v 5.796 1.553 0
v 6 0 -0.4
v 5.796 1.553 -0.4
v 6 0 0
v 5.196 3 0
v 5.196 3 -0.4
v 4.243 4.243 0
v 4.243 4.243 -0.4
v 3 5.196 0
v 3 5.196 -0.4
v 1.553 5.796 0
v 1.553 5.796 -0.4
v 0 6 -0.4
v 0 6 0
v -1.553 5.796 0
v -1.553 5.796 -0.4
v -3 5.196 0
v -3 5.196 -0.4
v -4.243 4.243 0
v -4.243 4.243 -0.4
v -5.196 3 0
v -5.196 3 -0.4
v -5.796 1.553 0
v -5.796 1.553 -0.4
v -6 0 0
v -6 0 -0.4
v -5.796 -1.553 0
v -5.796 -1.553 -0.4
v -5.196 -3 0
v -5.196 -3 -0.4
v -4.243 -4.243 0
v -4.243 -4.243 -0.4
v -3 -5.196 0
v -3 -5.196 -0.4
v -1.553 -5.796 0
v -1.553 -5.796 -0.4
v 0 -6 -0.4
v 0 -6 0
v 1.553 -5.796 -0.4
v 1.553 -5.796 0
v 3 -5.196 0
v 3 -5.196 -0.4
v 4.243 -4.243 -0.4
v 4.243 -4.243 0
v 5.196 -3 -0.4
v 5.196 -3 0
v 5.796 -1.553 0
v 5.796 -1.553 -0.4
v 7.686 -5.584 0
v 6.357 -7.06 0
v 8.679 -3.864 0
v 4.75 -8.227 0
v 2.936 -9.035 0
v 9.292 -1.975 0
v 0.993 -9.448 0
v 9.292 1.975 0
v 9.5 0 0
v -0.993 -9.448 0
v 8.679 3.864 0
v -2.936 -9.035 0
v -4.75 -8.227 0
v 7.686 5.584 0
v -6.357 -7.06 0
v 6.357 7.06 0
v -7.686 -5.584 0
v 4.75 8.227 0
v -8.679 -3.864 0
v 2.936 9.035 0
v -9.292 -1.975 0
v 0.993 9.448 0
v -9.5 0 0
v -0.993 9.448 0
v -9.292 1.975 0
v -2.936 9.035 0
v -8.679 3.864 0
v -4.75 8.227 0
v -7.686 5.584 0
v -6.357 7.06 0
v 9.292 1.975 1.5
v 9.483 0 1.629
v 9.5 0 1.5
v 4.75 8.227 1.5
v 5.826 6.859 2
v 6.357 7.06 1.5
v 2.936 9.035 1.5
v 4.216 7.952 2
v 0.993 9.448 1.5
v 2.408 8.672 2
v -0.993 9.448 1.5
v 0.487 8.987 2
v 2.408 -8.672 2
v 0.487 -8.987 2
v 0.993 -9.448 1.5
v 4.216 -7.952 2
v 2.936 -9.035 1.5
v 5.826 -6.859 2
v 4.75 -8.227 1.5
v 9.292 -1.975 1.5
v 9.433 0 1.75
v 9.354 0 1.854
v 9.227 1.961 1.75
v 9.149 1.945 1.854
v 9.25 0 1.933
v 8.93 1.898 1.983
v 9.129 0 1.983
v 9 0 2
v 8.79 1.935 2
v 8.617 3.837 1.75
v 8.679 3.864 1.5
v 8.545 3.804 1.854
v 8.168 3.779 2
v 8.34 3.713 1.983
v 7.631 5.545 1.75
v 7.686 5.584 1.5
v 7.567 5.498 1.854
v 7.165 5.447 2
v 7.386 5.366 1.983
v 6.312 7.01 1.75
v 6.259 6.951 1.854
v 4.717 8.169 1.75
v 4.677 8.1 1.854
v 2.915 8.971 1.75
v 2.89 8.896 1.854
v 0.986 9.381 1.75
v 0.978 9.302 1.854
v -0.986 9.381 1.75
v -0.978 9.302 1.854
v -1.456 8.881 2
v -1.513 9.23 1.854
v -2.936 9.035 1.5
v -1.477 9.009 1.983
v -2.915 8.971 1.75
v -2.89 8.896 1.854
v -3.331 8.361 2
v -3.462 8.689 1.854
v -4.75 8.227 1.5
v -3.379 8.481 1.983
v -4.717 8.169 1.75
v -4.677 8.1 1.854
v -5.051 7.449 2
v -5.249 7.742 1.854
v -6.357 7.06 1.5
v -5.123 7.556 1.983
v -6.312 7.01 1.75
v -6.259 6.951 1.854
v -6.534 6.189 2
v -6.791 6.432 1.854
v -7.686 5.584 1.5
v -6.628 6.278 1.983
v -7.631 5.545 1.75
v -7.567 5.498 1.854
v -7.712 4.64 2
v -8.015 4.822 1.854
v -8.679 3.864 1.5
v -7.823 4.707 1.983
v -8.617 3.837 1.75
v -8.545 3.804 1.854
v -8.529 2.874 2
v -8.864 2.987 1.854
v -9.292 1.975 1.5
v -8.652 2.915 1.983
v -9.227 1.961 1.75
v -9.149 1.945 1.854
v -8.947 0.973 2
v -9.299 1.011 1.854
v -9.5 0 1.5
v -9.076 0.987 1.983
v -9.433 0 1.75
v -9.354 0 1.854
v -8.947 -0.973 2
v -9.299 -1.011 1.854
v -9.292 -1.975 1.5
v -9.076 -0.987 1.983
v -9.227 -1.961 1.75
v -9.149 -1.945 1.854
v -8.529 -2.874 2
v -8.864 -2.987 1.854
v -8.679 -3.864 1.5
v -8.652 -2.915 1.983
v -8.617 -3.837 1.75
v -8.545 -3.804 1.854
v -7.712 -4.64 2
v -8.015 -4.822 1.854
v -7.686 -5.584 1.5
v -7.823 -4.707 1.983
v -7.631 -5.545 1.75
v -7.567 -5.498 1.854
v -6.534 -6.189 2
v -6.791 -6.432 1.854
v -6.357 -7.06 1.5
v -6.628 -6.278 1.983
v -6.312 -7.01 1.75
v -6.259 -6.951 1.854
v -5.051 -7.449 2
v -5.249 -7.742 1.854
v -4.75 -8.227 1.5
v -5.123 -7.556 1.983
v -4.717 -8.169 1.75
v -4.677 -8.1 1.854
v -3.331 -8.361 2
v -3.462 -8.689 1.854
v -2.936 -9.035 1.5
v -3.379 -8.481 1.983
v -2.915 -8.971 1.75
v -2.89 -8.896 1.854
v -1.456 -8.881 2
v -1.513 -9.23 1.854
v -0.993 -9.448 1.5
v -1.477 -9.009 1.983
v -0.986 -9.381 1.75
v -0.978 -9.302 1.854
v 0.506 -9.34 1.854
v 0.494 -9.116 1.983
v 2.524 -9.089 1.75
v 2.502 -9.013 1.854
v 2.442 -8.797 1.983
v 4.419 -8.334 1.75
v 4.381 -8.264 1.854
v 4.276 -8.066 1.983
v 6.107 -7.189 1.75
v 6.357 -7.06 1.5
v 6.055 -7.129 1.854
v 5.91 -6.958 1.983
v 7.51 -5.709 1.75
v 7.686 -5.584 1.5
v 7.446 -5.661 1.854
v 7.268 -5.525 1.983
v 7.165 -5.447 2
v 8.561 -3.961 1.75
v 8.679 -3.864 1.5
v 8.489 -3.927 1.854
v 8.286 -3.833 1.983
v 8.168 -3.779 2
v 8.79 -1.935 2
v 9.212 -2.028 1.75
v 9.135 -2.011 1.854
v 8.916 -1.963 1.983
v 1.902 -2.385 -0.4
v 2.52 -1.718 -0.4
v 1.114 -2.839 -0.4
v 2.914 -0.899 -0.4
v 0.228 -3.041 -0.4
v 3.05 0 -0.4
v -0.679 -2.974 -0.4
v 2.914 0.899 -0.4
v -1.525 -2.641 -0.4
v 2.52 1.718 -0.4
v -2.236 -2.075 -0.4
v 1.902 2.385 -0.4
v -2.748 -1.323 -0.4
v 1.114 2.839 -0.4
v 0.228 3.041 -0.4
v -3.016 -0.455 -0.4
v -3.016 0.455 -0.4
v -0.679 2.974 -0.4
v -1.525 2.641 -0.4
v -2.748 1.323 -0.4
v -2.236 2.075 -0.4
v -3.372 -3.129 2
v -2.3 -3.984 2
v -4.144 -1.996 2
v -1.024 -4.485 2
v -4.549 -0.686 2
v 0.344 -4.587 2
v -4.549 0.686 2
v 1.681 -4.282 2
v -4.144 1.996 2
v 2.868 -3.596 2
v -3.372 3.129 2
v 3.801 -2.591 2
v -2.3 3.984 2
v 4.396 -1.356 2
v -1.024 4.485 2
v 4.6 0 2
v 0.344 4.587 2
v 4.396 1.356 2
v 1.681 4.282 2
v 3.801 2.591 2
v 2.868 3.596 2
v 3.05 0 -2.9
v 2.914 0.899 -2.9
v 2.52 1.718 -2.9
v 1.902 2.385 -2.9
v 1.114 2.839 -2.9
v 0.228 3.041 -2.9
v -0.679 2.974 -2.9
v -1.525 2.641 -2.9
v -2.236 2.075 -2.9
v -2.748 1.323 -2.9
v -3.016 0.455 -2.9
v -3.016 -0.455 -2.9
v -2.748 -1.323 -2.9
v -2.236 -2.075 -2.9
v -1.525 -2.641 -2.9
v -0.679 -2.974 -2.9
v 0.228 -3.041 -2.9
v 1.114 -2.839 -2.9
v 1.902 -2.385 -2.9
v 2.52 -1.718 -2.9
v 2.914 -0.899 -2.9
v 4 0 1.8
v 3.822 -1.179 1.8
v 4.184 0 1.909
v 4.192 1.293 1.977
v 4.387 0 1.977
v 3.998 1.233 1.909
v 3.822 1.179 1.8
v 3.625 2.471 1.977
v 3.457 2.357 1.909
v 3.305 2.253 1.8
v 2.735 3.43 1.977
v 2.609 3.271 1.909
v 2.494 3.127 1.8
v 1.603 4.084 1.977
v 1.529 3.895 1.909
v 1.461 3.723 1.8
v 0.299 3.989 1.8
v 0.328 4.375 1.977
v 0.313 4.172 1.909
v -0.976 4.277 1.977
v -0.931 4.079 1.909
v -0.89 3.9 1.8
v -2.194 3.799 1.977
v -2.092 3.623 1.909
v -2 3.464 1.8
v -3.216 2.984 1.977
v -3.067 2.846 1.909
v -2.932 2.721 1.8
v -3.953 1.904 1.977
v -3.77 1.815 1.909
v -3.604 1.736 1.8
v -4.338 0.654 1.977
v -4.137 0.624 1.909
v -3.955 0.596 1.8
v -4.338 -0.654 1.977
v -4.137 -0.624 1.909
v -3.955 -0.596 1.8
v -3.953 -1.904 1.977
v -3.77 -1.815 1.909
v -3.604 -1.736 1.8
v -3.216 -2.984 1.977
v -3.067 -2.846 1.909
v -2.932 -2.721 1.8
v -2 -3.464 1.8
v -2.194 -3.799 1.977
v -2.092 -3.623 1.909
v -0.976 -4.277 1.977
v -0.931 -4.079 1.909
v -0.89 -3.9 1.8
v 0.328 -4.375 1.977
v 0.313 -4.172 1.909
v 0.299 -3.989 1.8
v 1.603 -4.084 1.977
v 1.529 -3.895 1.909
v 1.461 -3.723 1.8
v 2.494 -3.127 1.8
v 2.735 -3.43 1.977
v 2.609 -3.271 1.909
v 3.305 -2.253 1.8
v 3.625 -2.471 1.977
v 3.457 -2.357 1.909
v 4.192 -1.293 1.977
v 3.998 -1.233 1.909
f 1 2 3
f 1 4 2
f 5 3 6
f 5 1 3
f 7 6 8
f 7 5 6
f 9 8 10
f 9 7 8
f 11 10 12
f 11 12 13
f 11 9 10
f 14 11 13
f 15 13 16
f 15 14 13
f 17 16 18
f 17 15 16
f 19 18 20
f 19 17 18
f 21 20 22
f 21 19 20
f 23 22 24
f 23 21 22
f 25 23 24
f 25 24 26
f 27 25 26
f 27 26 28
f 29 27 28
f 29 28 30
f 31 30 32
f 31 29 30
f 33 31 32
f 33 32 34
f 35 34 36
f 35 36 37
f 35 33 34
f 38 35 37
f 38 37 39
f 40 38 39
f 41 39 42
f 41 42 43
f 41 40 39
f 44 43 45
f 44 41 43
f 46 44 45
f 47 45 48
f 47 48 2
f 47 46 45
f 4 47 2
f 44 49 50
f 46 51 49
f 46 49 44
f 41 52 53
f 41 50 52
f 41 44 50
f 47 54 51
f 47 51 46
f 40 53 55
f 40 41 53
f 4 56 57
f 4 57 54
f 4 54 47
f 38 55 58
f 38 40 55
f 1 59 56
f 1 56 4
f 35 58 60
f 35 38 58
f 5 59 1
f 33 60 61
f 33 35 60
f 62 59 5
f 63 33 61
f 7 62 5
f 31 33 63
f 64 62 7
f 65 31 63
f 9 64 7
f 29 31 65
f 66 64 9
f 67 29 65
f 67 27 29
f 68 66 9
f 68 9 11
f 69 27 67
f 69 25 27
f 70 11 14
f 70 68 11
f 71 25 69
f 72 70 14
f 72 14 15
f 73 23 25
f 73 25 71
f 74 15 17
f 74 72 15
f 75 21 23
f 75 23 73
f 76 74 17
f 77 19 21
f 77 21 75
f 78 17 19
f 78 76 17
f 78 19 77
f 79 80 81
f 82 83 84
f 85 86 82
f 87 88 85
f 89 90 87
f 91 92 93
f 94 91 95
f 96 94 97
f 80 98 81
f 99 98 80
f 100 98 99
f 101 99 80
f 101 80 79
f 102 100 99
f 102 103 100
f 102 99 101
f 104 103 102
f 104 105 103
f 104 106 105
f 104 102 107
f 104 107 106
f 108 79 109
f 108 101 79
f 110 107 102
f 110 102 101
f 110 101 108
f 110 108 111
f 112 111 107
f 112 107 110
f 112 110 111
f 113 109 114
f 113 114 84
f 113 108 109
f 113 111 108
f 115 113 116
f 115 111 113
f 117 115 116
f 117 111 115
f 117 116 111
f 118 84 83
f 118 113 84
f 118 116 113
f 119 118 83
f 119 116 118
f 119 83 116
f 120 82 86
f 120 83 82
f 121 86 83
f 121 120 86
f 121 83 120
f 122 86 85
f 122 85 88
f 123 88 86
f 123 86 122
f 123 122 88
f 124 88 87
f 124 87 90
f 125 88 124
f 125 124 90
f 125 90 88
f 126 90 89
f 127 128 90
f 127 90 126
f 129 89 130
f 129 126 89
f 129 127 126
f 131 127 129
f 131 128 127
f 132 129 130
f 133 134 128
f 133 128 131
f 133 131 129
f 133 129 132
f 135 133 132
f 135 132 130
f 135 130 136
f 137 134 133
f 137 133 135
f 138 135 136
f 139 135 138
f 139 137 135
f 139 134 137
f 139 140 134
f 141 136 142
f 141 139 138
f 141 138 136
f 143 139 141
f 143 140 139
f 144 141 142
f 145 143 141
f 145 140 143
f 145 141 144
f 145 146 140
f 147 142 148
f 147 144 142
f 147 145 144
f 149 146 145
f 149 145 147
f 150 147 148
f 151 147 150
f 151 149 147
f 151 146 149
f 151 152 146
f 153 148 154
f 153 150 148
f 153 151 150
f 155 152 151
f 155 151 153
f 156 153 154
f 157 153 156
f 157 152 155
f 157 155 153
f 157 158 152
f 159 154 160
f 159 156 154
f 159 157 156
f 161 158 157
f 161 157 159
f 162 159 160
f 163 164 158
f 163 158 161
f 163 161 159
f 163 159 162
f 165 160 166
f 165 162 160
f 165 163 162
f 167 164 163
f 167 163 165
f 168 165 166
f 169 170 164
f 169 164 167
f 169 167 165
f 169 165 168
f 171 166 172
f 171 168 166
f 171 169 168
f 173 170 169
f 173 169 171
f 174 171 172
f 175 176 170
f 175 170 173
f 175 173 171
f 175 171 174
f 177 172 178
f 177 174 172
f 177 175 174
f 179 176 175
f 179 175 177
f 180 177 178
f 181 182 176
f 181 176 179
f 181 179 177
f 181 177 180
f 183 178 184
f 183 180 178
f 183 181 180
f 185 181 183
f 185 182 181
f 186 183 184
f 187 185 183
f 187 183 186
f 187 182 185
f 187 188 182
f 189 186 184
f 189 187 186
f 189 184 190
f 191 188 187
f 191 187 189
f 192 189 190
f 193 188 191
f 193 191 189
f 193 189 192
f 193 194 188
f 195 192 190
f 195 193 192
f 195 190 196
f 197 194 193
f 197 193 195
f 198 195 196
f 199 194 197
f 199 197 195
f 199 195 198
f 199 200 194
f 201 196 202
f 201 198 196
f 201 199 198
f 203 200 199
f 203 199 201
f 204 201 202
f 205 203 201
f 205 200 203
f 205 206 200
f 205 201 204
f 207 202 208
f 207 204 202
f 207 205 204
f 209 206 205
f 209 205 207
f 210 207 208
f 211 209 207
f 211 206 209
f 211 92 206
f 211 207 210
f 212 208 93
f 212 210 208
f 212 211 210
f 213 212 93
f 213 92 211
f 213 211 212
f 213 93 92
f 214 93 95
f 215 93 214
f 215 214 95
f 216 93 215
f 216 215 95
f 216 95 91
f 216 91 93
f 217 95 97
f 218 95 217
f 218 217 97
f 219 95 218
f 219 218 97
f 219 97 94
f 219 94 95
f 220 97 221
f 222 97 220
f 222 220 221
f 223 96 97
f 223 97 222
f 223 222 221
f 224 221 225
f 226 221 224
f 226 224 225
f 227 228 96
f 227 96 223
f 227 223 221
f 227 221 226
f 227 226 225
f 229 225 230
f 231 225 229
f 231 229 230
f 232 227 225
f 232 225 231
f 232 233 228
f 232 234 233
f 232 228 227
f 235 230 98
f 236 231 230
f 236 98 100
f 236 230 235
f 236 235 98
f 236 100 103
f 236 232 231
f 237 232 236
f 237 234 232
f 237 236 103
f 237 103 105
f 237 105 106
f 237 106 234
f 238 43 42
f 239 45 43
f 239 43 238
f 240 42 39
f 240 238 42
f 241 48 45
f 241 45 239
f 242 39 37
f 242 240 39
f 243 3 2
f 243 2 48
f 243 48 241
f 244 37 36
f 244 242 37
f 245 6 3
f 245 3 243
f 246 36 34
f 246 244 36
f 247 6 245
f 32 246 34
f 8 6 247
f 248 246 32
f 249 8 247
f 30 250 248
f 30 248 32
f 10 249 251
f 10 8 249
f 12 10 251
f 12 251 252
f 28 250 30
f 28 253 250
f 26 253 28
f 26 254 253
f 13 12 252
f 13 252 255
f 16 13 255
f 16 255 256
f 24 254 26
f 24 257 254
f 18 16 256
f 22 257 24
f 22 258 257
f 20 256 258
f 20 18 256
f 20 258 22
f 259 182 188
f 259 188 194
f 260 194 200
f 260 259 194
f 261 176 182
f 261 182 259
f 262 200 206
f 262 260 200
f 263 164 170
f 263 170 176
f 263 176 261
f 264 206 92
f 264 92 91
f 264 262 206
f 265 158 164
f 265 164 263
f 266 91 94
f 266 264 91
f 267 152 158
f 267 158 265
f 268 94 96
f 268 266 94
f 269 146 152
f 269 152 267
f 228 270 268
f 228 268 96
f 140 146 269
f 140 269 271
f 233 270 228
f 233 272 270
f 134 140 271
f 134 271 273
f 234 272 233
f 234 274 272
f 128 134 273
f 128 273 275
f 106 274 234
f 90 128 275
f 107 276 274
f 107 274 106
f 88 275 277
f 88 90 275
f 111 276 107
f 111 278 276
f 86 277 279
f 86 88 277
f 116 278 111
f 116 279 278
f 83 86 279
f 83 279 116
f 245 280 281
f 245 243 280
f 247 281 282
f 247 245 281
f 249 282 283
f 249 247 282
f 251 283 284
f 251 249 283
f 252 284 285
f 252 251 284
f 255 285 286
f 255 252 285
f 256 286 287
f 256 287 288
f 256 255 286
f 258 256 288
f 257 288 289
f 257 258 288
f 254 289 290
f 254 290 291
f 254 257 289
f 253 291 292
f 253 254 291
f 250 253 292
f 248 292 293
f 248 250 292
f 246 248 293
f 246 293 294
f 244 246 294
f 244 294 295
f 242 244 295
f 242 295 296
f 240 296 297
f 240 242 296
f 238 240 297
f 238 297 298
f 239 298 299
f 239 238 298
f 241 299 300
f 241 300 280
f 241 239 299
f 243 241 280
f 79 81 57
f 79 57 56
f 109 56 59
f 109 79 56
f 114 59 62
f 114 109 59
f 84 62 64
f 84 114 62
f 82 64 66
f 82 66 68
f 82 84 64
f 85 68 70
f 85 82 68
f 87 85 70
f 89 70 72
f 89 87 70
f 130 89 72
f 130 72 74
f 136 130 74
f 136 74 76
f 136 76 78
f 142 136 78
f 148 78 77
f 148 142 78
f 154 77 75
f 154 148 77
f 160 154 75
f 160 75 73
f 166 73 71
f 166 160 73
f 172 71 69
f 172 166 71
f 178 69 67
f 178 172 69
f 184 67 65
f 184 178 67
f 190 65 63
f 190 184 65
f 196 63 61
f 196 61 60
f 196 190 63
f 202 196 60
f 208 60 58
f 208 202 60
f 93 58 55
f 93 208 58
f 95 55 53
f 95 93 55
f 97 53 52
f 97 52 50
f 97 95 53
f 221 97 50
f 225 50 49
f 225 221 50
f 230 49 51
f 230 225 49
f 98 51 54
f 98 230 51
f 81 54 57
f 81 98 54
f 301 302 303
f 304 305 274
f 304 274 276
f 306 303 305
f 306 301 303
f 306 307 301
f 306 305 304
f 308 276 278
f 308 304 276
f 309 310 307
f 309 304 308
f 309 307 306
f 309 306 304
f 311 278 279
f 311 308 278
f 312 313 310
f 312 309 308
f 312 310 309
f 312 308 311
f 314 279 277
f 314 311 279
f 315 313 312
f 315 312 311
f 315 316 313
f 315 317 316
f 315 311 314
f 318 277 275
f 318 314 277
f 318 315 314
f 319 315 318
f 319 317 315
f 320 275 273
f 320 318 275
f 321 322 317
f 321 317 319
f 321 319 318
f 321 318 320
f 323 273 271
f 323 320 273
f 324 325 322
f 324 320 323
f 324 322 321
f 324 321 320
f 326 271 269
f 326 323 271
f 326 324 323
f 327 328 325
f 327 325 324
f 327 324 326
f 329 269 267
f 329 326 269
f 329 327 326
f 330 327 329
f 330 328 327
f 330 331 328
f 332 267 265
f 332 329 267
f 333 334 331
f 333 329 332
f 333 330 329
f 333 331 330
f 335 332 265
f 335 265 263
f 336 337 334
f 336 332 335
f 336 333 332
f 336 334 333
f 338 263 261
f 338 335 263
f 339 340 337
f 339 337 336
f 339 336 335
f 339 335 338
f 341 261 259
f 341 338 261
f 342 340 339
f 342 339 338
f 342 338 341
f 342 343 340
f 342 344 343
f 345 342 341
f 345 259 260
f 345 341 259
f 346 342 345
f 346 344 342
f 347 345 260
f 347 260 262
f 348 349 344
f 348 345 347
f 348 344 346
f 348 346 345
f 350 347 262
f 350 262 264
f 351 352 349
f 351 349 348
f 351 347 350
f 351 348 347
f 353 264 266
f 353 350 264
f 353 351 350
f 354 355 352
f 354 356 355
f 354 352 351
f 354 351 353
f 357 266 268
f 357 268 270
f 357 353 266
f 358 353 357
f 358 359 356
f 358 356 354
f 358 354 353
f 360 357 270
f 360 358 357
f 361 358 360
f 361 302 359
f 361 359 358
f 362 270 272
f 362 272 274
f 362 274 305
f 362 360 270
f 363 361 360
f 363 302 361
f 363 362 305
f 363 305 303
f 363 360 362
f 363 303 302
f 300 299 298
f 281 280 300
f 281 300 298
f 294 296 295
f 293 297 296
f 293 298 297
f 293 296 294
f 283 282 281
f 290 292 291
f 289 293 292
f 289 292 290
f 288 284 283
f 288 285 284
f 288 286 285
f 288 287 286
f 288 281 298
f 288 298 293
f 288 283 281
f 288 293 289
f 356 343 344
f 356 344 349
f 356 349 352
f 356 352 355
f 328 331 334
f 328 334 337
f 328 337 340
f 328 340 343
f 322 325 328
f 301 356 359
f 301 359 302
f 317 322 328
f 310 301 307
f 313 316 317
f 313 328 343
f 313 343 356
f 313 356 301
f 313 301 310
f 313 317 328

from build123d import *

# Parameters (mm, degrees)
F0_W   = 3.05
F0_H   = 0.4
F0_W_2 = 2.95
F0_H_2 = 2.5
F2_R   = 0.5


# Not quite as in the source:
# - a fillet or chamfer that OpenCascade refuses, or shapes differently, is made with other operations: its cross-section is extruded or revolved along the edge and cut away or added
# - a feature names something its author has since deleted; it is built from what else it names


with BuildPart() as f1:
    # F0 (on Front) → F1 (revolve)
    with BuildSketch(Plane.XZ):
        Polygon((0, 1.8), (0, 0), (3.05, 0), (6, 0), (9.5, 0), (9.5, 2), (4, 2), (4, 1.8), align=None)
        with Locations((1.525, -0.2)):
            Rectangle(F0_W, F0_H)
        with Locations((4.525, -0.2)):
            Rectangle(F0_W_2, F0_H)
        with Locations((1.525, -1.65)):
            Rectangle(F0_W, F0_H_2)
    revolve(axis=Axis((0, 0, 0.9), (0, 0, 1)))

    # F2
    f2_edges = [f1.edges().sort_by_distance(p)[0] for p in [
        (-9.5, 0, 2),
    ]]
    fillet(f2_edges, radius=F2_R)

    # F3: fillet of radius 1 on 1 edges, made by hand

    # F3_s1 → F3_t2 (revolve, cut)
    with BuildSketch(Plane.XZ):
        with BuildLine():
            ThreePointArc((4.6, 2), (4.283772234, 1.9486832981), (4, 1.8))
            Line((4, 1.8), (4, 2))
            Line((4, 2), (4.6, 2))
        make_face()
    revolve(axis=Axis((0, 0, 2), (0, 0, 1)), mode=Mode.SUBTRACT)


solid = f1.part
